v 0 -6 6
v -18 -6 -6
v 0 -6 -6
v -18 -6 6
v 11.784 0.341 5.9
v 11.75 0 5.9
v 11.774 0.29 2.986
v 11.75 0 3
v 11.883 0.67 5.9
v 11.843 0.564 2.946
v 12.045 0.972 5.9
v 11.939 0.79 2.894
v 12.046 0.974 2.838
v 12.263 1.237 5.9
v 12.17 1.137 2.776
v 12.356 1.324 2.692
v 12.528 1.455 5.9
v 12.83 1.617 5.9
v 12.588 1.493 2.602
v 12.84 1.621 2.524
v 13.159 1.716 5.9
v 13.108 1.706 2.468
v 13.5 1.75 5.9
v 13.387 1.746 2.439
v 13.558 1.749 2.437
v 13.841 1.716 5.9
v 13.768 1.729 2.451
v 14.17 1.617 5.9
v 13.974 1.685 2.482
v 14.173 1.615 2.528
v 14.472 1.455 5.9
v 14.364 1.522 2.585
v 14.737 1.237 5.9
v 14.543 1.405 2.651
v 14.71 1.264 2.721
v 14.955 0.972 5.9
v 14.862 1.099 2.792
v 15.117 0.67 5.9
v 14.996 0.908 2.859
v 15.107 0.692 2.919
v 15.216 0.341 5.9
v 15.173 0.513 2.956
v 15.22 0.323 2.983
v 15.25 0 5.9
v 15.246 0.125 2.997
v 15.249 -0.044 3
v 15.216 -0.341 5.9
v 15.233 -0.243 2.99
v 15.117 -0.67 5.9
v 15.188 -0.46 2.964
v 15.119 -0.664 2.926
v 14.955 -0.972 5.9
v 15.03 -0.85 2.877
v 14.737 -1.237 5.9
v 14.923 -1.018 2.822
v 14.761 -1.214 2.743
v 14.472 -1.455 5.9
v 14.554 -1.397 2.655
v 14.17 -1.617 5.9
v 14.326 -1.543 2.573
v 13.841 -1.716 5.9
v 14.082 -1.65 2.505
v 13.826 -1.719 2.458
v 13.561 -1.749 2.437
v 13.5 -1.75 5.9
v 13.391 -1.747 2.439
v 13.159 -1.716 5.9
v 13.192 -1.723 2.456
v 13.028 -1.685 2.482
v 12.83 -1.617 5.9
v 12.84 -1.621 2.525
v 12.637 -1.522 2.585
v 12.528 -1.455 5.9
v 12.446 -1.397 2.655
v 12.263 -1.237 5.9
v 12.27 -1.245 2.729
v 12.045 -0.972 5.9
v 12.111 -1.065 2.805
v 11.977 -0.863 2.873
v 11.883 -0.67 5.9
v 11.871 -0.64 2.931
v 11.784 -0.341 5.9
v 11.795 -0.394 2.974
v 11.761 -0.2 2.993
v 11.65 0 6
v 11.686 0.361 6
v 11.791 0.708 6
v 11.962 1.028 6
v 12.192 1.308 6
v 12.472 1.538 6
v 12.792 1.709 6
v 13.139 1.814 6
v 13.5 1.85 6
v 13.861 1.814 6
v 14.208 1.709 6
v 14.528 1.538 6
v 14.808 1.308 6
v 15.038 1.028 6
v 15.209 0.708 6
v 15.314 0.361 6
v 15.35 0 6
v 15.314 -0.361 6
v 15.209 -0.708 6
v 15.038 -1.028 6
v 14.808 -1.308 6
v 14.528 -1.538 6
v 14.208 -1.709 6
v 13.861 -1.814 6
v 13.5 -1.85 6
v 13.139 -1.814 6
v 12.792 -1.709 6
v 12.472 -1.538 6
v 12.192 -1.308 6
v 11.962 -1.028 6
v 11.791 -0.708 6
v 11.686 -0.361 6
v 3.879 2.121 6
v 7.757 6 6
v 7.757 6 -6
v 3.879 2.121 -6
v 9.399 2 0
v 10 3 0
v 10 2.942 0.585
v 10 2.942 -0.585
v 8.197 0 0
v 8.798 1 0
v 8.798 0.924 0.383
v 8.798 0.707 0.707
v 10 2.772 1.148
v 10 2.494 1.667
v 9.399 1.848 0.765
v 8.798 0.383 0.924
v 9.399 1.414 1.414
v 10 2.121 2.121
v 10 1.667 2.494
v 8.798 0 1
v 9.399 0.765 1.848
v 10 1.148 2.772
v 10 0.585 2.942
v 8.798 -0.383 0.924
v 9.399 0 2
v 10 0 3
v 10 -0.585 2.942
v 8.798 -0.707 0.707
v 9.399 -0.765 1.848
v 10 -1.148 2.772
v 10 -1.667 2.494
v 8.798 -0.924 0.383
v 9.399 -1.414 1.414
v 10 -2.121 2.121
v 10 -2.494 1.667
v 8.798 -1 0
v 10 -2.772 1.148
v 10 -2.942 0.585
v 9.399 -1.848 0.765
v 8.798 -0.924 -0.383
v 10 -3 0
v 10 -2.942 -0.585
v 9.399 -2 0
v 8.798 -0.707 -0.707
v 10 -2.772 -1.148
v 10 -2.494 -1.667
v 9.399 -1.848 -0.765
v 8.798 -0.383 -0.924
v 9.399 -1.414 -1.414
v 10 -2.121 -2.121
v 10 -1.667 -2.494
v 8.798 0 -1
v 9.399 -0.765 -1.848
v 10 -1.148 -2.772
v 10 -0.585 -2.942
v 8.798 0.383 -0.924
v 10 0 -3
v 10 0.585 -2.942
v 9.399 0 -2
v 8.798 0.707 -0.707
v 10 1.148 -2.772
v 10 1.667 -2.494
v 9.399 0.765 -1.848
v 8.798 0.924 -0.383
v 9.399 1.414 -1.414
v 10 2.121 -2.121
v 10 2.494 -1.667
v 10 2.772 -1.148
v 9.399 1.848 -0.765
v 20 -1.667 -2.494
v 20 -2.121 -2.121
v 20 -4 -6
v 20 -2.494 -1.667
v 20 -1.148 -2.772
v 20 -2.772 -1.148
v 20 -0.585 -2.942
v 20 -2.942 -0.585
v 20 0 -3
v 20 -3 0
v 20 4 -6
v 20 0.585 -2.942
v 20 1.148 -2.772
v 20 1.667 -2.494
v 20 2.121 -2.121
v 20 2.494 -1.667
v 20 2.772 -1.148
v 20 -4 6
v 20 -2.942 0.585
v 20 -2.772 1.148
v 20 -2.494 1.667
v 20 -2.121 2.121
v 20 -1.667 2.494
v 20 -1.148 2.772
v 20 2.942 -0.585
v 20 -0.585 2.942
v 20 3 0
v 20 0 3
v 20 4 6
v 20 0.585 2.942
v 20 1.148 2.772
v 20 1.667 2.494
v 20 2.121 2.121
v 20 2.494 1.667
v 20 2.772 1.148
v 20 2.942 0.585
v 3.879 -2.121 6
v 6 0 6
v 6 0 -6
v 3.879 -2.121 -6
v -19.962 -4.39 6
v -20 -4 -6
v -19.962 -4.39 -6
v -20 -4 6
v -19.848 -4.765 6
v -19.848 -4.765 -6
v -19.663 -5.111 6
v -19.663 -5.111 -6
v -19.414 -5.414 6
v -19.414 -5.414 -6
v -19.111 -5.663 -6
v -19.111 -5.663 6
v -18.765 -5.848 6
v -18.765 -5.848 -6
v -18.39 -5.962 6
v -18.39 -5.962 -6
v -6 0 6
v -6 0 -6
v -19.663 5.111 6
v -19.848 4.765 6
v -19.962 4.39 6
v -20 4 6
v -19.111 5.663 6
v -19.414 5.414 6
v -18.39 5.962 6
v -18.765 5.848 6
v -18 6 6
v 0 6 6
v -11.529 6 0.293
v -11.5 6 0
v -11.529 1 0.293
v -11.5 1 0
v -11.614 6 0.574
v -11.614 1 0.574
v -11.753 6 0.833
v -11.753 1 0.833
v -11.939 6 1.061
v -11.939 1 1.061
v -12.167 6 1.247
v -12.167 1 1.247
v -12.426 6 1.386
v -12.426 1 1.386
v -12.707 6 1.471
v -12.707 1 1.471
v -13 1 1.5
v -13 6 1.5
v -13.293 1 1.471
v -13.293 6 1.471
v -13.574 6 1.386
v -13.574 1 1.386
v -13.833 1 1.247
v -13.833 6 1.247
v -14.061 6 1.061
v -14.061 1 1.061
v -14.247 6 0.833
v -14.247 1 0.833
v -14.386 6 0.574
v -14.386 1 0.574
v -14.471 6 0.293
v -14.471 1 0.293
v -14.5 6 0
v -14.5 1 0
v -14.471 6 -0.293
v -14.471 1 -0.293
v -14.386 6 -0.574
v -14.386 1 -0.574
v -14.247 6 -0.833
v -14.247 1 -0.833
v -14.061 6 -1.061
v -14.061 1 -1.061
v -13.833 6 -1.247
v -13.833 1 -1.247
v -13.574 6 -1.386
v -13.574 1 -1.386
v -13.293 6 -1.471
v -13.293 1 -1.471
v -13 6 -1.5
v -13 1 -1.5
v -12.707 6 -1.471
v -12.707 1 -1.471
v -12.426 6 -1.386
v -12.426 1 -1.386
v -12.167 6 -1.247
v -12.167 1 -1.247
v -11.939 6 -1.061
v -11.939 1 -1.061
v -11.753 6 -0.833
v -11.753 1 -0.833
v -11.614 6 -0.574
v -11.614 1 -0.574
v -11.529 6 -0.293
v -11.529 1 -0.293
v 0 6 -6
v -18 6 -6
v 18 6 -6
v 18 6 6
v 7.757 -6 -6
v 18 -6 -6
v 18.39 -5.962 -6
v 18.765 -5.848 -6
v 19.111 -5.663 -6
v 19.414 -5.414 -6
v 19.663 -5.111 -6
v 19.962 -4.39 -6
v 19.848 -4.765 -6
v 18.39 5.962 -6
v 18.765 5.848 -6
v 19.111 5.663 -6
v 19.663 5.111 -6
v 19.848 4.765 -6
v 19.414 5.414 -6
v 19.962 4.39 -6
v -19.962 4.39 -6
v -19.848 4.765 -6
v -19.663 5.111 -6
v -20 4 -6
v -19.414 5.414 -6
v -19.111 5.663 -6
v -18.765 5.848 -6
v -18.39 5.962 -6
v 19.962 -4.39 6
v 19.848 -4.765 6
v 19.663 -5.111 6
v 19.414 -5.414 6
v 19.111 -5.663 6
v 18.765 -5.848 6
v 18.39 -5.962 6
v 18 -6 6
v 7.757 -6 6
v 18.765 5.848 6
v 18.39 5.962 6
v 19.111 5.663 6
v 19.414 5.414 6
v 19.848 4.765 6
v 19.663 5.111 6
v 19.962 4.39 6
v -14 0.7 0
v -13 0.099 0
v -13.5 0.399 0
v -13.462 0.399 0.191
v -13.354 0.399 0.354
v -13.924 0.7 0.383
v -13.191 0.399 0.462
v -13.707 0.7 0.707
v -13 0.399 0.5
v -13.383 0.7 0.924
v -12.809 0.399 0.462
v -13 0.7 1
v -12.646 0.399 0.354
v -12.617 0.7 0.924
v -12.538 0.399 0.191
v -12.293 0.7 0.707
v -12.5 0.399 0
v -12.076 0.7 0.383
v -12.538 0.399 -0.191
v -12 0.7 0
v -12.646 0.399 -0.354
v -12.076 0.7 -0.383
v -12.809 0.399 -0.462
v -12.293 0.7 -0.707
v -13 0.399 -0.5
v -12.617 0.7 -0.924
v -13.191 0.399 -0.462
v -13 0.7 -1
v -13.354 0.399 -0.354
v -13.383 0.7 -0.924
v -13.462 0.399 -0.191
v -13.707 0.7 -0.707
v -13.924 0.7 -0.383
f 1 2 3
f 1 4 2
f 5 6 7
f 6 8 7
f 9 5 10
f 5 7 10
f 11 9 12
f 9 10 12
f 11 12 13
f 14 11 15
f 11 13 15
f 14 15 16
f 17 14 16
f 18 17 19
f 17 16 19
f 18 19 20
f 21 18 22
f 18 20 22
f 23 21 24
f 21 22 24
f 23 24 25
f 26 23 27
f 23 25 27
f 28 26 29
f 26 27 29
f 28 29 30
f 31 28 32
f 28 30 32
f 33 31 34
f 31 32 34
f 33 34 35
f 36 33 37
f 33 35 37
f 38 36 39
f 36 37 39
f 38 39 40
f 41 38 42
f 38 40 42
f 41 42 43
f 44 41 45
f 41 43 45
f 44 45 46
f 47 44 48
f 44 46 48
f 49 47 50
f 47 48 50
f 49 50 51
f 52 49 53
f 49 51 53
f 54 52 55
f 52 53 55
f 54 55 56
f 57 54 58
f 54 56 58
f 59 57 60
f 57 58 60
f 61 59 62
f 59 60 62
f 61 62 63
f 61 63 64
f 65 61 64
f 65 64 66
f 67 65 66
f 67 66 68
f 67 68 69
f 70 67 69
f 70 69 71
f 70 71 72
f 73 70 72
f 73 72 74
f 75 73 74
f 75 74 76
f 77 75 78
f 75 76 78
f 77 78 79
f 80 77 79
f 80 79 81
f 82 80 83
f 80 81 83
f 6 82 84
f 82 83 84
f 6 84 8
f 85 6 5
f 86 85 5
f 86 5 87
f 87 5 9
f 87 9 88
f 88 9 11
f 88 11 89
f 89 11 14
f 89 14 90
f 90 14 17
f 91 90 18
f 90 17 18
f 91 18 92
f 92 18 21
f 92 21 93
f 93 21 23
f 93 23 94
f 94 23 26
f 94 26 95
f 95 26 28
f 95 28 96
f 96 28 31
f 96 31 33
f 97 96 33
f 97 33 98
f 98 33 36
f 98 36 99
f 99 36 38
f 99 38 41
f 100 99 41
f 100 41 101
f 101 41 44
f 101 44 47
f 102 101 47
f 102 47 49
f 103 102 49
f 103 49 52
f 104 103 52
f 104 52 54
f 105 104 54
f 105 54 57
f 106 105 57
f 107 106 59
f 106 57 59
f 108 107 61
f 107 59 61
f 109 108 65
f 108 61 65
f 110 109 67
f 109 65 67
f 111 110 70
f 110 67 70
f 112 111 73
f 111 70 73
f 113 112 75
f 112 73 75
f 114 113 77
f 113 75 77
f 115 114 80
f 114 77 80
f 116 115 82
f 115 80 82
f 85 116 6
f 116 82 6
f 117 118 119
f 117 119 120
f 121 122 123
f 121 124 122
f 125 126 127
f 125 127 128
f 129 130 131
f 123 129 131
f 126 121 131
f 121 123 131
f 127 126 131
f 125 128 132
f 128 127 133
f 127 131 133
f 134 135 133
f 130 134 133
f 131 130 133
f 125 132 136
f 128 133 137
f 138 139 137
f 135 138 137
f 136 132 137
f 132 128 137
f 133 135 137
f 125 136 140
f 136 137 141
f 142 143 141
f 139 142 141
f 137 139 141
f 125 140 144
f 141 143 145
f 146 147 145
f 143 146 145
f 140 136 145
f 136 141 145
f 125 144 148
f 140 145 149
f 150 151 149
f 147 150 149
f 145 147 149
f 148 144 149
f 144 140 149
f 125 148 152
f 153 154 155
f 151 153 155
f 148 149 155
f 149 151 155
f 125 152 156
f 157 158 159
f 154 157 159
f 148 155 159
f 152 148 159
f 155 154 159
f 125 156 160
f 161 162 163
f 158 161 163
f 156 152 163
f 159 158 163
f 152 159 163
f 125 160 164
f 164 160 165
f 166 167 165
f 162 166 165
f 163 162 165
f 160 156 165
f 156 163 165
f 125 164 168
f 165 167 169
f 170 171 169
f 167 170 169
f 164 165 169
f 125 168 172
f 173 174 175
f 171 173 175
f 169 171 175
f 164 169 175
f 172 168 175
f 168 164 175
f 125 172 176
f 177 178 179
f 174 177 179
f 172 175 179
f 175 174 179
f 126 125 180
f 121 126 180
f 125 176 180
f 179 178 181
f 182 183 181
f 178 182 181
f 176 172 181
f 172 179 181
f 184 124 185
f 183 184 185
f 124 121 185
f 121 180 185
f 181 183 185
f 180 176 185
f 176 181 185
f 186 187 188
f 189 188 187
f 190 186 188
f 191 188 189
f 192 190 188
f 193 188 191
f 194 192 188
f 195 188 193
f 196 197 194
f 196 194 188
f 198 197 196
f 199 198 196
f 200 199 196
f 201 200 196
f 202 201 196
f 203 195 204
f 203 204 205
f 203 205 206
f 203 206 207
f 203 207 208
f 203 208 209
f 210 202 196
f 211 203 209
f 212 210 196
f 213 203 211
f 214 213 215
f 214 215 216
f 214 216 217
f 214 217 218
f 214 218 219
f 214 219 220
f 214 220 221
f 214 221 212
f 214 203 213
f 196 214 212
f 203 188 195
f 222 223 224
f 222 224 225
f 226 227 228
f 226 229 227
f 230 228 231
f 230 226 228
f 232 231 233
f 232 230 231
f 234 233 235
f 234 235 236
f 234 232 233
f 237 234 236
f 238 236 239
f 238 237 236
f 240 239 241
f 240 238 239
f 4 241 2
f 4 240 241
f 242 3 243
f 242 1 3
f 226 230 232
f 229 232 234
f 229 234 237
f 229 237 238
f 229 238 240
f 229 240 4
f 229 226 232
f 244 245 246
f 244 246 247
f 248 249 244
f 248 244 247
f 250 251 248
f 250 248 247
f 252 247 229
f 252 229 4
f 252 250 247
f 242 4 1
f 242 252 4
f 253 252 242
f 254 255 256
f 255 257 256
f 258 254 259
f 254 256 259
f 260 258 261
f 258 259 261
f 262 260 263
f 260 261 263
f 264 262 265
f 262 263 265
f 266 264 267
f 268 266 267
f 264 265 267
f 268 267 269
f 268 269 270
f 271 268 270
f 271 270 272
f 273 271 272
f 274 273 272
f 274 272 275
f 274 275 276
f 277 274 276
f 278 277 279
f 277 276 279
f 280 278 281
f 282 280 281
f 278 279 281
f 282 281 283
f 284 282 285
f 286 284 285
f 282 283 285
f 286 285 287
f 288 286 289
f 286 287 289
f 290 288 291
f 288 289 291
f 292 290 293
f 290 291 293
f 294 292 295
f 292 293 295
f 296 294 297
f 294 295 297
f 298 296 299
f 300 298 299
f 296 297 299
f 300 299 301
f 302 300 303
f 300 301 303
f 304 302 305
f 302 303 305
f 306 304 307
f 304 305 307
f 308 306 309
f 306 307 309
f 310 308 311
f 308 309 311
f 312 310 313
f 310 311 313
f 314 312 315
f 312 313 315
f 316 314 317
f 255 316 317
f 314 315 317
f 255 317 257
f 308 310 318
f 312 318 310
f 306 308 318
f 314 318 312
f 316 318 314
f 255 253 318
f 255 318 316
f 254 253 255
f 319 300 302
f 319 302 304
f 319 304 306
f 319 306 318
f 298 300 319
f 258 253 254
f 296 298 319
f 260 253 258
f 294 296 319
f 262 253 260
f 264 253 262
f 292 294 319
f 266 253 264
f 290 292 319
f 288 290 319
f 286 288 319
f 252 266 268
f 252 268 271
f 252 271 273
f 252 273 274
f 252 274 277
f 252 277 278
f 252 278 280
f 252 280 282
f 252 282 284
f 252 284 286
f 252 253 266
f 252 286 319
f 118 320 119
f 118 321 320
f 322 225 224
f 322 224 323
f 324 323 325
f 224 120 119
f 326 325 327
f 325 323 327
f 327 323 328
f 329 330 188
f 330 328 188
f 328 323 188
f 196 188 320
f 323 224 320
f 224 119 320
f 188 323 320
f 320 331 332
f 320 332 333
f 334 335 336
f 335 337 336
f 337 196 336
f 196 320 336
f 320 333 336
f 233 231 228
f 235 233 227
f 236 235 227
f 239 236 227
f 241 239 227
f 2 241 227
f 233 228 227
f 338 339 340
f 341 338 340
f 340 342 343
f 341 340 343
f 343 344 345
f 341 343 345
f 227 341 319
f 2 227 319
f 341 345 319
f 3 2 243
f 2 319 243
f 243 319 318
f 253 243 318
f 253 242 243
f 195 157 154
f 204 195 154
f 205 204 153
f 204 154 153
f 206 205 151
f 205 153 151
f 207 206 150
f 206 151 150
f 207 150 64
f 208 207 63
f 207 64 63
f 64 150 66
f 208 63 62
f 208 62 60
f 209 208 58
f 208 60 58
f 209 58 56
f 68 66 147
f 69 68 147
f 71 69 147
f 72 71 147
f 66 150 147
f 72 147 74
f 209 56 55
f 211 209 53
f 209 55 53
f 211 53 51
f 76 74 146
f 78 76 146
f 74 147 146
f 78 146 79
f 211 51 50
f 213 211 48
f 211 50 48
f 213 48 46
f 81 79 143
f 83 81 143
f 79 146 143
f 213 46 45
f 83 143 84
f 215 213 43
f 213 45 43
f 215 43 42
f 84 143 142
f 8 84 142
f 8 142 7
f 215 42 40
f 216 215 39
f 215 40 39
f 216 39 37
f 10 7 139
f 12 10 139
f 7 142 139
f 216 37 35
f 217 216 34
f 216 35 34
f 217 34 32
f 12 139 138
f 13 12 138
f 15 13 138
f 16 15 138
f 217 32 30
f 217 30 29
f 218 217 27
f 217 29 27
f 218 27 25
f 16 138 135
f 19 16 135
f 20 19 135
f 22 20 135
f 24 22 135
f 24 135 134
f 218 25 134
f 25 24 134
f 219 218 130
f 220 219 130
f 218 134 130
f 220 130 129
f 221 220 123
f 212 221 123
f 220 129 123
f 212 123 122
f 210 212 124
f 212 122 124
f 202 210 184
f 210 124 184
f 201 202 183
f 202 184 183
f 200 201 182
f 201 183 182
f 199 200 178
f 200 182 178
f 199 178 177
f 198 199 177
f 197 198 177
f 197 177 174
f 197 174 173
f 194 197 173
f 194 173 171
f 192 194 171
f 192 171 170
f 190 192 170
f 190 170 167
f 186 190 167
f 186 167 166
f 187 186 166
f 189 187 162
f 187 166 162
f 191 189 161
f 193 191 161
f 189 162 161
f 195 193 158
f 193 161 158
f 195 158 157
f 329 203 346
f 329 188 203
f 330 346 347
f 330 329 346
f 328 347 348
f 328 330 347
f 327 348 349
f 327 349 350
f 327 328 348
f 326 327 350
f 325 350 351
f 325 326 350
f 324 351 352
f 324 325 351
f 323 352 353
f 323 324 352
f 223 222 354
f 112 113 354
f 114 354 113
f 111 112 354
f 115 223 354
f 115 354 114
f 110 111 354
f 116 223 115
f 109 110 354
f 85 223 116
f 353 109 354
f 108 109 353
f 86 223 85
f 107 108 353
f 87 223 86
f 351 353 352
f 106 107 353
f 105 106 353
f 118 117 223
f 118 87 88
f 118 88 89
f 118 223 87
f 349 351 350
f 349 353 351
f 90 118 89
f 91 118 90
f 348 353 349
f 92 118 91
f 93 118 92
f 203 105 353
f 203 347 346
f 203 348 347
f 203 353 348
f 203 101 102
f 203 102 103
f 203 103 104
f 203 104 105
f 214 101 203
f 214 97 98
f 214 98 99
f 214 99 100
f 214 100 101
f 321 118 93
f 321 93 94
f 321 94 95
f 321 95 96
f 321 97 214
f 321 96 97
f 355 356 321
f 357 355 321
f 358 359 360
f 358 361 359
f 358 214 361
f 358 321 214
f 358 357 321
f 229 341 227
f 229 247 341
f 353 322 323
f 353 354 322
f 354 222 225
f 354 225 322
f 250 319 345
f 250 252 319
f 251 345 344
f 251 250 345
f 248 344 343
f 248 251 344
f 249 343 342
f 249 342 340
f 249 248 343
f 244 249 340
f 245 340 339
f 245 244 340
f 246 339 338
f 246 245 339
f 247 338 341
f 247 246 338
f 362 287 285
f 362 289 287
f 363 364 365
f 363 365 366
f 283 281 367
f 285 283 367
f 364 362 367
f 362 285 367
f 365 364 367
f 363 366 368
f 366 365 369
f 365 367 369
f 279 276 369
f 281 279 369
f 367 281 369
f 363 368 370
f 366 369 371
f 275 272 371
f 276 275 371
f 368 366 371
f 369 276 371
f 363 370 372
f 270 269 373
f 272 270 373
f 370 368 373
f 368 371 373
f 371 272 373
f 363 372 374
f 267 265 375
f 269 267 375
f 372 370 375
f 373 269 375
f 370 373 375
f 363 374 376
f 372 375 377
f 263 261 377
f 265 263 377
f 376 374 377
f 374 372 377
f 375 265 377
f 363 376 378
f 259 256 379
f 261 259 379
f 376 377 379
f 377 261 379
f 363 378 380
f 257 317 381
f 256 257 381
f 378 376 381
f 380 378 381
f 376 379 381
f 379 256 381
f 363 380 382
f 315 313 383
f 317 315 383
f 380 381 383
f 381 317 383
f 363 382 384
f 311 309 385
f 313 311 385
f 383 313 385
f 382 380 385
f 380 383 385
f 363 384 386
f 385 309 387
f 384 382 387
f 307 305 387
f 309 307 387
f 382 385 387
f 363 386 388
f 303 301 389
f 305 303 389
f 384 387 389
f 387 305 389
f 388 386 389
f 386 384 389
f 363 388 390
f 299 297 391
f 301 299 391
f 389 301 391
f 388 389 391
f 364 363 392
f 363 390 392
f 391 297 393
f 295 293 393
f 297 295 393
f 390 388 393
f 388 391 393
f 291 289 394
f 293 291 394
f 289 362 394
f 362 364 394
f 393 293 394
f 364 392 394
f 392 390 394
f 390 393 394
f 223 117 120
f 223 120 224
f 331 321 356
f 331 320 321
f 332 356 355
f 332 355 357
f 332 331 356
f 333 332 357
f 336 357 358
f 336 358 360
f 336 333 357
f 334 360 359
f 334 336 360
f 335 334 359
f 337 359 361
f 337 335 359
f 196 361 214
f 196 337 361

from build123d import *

# Parameters (mm, degrees)
F1_DEPTH       = 6
F2_DEPTH       = 6
F4_D           = 6
F4_DEPTH       = 10
F4_TIP         = 1.8025818571
F6_D           = 3.5
F6_DEPTH       = 6.5
F6_CSINK_D     = 3.7
F6_CSINK_ANGLE = 90
F6_TIP         = 1.0515060833
F8_D           = 3
F8_DEPTH       = 5
F8_TIP         = 0.9012909285
F9_R           = 2
F9_2_R         = 2


with BuildPart() as f1:
    # F0 (on Top) → F1 (new body, symmetric)
    with BuildSketch(Plane.XY):
        Polygon((0, 6), (-20, 6), (-20, -6), (0, -6), (-3.8786796564, -2.1213203436), (-6, 0), (-3.8786796564, 2.1213203436), align=None)
    extrude(amount=F1_DEPTH, both=True)

    # F8
    with Locations(Plane(origin=(0, 6, 0), x_dir=(-1, 0, 0), z_dir=(0, 1, 0))):
        with Locations((13, 0)):
            Hole(F8_D / 2, depth=F8_DEPTH)
            with Locations((0, 0, -(F8_DEPTH + F8_TIP / 2))):  # 118° drill point
                Cone(0, F8_D / 2, F8_TIP, mode=Mode.SUBTRACT)

    # F9#2
    f9_2_edges = [f1.edges().sort_by_distance(p)[0] for p in [
        (-20, 6, 0),
        (-20, -6, 0),
    ]]
    fillet(f9_2_edges, radius=F9_2_R)


with BuildPart() as f2:
    # F0 (on Top) → F2 (new body, symmetric)
    with BuildSketch(Plane.XY):
        Polygon((20, 6), (7.7573593129, 6), (3.8786796564, 2.1213203436), (6, 0), (3.8786796564, -2.1213203436), (7.7573593129, -6), (20, -6), align=None)
    extrude(amount=F2_DEPTH, both=True)

    # F4
    with Locations(Plane.YZ.offset(20)):
        with Locations((0, 0)):
            Hole(F4_D / 2, depth=F4_DEPTH)
            with Locations((0, 0, -(F4_DEPTH + F4_TIP / 2))):  # 118° drill point
                Cone(0, F4_D / 2, F4_TIP, mode=Mode.SUBTRACT)

    # F6
    with Locations(Plane.XY.offset(6)):
        with Locations((13.5, 0)):
            CounterSinkHole(F6_D / 2, F6_CSINK_D / 2, depth=F6_DEPTH, counter_sink_angle=F6_CSINK_ANGLE)
            with Locations((0, 0, -(F6_DEPTH + F6_TIP / 2))):  # 118° drill point
                Cone(0, F6_D / 2, F6_TIP, mode=Mode.SUBTRACT)

    # F9
    f9_edges = [f2.edges().sort_by_distance(p)[0] for p in [
        (20, 6, 0),
        (20, -6, 0),
    ]]
    fillet(f9_edges, radius=F9_R)


solid = Compound([f1.part, f2.part])
